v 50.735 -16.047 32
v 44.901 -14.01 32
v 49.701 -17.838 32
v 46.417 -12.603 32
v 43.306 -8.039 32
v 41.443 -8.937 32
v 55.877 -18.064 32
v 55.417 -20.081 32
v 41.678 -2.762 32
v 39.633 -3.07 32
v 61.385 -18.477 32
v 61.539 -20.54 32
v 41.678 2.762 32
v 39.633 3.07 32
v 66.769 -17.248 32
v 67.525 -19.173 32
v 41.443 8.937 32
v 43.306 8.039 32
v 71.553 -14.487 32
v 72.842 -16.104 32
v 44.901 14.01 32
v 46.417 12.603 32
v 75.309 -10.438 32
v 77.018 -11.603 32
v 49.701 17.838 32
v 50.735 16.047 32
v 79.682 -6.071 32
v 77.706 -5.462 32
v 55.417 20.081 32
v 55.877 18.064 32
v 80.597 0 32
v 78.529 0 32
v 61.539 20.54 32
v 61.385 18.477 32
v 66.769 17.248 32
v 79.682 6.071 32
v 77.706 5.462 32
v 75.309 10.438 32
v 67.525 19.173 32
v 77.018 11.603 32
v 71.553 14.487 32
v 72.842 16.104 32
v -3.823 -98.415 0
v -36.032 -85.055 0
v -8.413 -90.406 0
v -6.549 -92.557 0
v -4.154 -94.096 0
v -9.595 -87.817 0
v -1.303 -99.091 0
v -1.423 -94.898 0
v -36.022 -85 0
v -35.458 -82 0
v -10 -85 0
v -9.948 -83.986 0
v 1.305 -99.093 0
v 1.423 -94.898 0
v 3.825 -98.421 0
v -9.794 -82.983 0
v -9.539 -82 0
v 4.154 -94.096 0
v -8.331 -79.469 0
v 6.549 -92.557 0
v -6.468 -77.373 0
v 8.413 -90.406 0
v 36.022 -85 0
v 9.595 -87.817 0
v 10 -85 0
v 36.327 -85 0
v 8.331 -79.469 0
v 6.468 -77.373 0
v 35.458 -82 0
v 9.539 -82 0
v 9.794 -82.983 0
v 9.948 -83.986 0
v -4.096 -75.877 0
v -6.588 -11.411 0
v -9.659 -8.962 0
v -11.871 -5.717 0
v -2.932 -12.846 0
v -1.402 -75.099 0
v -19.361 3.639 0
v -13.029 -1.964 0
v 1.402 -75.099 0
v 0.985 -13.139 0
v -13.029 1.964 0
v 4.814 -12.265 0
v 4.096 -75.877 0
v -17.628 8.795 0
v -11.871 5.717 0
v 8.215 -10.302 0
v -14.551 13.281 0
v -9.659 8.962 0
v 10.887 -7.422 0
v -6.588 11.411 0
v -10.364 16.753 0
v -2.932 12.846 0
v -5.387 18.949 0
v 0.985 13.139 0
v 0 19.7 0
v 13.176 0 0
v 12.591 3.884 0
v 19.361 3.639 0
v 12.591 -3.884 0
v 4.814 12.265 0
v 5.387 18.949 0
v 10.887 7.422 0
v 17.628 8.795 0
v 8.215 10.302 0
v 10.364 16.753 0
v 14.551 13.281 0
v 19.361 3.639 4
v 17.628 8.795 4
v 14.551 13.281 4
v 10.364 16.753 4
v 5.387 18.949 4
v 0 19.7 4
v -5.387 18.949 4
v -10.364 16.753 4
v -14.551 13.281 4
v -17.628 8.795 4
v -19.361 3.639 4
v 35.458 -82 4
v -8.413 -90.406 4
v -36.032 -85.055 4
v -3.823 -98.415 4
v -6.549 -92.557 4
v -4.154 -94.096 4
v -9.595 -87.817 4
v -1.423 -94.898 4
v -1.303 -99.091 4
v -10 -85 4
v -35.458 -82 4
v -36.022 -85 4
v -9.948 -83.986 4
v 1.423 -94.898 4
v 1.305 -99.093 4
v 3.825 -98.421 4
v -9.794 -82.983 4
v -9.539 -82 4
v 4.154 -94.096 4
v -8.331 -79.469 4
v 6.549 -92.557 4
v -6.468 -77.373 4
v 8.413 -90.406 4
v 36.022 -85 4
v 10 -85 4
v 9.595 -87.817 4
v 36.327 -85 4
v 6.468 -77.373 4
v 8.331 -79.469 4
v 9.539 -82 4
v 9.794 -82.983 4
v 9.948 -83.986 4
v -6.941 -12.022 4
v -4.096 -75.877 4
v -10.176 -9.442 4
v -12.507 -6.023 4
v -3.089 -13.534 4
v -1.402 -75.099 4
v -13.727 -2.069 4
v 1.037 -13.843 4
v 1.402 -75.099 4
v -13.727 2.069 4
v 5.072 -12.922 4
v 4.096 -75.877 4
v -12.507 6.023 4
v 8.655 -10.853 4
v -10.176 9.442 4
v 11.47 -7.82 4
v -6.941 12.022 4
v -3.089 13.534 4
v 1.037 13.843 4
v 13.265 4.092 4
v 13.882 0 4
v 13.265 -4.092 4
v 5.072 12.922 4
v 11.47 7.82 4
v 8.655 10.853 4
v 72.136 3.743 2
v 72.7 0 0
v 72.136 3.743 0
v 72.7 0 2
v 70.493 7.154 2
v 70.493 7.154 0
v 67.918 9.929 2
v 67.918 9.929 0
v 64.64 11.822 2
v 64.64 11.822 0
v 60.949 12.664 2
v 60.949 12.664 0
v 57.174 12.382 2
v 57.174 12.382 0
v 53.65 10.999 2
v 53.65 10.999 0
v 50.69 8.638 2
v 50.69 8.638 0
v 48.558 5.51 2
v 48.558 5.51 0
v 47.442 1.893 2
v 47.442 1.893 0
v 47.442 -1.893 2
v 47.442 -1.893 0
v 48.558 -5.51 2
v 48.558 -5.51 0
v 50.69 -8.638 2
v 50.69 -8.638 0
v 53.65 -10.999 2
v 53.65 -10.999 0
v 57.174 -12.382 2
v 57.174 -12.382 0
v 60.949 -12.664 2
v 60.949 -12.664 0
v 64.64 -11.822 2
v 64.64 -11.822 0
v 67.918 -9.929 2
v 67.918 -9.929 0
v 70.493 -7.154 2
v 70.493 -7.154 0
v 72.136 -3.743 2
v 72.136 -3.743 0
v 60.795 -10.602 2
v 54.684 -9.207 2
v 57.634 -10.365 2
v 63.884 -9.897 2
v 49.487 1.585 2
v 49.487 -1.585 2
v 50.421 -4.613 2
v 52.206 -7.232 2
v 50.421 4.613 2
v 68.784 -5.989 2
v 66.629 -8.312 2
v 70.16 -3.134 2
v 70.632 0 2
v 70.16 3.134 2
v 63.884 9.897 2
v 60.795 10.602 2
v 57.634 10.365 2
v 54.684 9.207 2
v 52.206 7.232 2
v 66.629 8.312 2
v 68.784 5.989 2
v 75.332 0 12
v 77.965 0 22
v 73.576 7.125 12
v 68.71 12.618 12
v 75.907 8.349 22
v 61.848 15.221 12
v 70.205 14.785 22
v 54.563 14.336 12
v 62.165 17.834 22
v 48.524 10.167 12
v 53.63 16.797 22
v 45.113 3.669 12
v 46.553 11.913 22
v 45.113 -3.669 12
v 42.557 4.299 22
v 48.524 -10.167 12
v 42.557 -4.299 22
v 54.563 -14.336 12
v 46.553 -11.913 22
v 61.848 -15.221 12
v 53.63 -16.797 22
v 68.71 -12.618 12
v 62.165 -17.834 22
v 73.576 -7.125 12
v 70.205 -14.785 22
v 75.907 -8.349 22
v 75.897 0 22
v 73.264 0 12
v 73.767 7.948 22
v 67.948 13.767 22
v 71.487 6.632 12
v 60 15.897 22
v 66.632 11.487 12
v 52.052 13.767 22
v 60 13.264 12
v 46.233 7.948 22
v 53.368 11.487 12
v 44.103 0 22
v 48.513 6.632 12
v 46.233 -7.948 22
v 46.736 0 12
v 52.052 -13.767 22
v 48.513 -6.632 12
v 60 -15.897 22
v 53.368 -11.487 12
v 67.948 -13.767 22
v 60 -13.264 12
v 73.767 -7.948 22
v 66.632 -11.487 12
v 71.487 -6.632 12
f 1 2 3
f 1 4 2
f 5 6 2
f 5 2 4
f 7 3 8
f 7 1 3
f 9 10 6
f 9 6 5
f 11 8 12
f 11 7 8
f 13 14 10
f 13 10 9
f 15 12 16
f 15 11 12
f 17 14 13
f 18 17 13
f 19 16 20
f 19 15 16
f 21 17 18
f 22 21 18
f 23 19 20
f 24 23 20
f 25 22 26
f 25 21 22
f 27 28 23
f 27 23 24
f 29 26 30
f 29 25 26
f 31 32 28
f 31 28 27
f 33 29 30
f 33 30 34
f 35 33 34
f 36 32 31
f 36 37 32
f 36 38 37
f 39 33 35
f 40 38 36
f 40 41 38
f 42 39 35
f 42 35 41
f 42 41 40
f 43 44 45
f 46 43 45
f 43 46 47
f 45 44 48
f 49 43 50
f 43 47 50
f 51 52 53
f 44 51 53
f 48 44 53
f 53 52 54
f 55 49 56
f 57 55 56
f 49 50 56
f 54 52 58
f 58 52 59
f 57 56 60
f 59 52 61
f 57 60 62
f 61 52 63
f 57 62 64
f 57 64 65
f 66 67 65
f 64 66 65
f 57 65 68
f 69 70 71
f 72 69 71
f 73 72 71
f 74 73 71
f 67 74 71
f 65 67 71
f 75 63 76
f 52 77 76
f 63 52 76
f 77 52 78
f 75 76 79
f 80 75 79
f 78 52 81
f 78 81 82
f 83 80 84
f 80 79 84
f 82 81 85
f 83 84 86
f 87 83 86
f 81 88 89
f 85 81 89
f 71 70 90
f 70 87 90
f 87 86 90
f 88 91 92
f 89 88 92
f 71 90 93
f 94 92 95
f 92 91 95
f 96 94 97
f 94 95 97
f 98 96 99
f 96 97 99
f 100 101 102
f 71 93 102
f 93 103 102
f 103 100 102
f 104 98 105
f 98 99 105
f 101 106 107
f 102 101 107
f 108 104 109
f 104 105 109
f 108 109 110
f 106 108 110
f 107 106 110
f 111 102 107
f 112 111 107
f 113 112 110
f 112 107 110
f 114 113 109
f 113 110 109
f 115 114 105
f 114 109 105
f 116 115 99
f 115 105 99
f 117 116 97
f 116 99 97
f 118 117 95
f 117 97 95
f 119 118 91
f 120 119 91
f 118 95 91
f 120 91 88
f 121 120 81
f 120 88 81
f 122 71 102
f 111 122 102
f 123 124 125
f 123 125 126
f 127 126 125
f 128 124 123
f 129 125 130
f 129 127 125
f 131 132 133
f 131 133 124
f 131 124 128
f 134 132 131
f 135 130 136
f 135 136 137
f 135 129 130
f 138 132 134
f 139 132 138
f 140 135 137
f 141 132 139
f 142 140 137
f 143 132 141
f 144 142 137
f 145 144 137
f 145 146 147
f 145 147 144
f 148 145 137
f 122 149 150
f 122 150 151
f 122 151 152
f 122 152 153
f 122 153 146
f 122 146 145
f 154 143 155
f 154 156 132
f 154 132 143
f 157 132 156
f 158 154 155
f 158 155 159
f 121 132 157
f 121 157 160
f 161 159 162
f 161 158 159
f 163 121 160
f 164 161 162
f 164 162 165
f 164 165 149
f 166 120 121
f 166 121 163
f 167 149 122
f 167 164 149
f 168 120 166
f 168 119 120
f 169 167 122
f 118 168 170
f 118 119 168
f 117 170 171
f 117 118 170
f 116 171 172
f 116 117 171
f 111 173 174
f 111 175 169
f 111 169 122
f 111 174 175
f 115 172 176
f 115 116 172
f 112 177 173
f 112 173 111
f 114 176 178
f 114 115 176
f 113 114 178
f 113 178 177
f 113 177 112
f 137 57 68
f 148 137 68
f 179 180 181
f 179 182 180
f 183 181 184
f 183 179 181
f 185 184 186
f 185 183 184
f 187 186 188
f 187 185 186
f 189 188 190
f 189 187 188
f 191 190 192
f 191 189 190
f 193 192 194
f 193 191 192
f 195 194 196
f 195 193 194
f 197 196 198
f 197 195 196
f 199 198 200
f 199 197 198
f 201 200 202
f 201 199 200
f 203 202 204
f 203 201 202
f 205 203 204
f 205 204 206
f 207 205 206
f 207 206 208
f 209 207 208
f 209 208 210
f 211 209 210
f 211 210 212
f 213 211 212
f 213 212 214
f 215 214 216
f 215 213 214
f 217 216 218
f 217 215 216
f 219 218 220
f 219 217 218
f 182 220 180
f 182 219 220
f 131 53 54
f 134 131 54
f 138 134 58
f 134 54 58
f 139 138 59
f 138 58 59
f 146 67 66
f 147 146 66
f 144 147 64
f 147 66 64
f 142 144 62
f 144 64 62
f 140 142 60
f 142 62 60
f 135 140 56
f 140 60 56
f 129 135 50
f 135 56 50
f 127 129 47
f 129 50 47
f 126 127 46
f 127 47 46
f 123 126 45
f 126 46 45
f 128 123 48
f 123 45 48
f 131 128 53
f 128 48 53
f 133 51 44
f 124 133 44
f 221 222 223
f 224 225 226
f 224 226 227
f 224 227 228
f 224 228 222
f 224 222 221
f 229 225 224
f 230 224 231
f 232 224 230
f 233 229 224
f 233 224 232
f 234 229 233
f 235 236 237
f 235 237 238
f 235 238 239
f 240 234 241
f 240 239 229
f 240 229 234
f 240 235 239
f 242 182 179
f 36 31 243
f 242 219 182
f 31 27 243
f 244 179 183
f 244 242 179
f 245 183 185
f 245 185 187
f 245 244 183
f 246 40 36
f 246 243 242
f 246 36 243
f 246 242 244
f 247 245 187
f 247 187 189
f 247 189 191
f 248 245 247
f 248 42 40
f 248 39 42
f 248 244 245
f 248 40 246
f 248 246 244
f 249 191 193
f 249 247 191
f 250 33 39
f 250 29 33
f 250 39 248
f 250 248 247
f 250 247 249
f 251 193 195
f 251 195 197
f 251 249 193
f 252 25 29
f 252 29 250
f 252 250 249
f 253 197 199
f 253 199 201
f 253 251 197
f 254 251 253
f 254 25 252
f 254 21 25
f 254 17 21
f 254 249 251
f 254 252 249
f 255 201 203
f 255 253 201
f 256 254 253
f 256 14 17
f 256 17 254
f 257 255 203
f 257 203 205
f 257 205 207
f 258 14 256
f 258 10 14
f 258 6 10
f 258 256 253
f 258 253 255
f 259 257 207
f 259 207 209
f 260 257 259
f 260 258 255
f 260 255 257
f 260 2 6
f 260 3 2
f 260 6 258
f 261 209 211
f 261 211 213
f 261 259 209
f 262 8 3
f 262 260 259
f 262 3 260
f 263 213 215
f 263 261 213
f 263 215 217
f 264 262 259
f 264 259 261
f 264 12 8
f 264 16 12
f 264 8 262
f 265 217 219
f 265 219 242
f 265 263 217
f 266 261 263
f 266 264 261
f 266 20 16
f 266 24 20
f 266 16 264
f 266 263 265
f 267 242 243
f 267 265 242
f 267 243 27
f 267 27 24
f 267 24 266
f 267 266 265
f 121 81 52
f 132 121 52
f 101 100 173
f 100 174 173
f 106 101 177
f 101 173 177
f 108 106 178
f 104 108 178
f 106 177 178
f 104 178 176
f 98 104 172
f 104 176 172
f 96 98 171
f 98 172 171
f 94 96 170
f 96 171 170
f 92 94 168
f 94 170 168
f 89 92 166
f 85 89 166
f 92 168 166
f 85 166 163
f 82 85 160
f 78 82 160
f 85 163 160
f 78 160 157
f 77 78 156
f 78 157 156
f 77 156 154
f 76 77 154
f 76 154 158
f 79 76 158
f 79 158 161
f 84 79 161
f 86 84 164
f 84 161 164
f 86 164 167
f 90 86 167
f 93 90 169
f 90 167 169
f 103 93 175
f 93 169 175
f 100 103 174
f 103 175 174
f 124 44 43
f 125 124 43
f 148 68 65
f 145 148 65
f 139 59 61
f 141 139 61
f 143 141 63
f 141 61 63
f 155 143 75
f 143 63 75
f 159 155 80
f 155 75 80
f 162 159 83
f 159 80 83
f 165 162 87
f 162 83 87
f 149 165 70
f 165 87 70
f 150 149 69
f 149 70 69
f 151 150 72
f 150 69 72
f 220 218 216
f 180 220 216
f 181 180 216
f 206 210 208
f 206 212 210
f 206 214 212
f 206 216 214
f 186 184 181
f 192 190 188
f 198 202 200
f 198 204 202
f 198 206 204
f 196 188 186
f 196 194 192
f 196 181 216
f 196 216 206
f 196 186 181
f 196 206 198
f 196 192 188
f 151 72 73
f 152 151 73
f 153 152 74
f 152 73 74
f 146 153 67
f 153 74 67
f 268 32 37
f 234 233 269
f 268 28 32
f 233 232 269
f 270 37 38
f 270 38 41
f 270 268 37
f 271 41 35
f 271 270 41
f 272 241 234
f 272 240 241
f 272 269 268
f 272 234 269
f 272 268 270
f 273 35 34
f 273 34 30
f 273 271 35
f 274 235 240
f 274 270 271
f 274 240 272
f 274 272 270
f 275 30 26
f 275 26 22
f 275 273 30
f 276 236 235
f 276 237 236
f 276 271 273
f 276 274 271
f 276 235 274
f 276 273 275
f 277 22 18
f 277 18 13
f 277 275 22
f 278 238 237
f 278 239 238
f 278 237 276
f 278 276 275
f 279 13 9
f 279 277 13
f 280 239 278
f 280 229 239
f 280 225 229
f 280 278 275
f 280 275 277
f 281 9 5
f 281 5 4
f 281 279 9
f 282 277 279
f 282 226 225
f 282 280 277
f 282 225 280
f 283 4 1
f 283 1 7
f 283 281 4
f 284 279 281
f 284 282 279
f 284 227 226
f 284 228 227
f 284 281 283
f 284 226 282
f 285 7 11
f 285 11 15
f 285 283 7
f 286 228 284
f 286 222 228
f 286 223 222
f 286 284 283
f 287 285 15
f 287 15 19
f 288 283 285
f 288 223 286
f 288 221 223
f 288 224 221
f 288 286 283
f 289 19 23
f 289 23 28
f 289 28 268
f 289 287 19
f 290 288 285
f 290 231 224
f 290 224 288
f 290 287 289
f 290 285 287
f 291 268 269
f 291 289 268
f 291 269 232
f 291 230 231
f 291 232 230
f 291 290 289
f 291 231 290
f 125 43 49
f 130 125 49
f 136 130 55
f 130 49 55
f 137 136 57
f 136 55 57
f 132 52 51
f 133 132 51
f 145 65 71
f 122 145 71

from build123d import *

# Parameters (mm, degrees)
F0_R     = 13
F1_DEPTH = 4


# Not quite as in the source:
# - a fillet or chamfer that OpenCascade refuses, or shapes differently, is made with other operations: its cross-section is extruded or revolved along the edge and cut away or added


with BuildPart() as f1:
    # F0 (on Top) → F1 (new body)
    with BuildSketch(Plane.XY):
        with BuildLine():
            Line((-36.0218728627, -85), (-10, -85))
            ThreePointArc((-10, -85), (-9.8841772582, -83.4824230072), (-9.5393920142, -82))
            Line((-9.5393920142, -82), (-35.4579826076, -82))
            Line((-35.4579826076, -82), (-36.0218728627, -85))
        make_face()
        with BuildLine():
            Line((10, -85), (36.0218728627, -85))
            Line((36.0218728627, -85), (35.4579826076, -82))
            Line((35.4579826076, -82), (9.5393920142, -82))
            ThreePointArc((9.5393920142, -82), (9.8841772582, -83.4824230072), (10, -85))
        make_face()
        with BuildLine():
            Line((9.5393920142, -82), (35.4579826076, -82))
            Line((35.4579826076, -82), (19.3609549854, 3.6391512822))
            ThreePointArc((19.3609549854, 3.6391512822), (0, 19.7), (-19.3609549854, 3.6391512822))
            Line((-19.3609549854, 3.6391512822), (-35.4579826076, -82))
            Line((-35.4579826076, -82), (-9.5393920142, -82))
            ThreePointArc((-9.5393920142, -82), (0, -75), (9.5393920142, -82))
        make_face()
        Circle(F0_R, mode=Mode.SUBTRACT)
        with BuildLine():
            Line((3.8250876827, -98.4205655408), (36.3271264003, -85))
            Line((36.3271264003, -85), (36.0218728627, -85))
            Line((36.0218728627, -85), (10, -85))
            ThreePointArc((10, -85), (0, -95), (-10, -85))
            Line((-10, -85), (-36.0218728627, -85))
            Line((-36.0218728627, -85), (-36.0322895223, -85.0554185474))
            Line((-36.0322895223, -85.0554185474), (-3.822600818, -98.4145562205))
            ThreePointArc((-3.822600818, -98.4145562205), (0.0006462735, -99.1775278473), (3.8250876827, -98.4205655408))
        make_face()
    extrude(amount=F1_DEPTH)

    # F4: chamfer of 5 x 0.8816349035 on 1 edges, made by hand

    # F4_s1 → F4_t2 (revolve, cut)
    with BuildSketch(Plane.XZ):
        Polygon((13, -1), (13.8816349035, 4), (13, 4), align=None)
    revolve(axis=Axis((0, 0, 4), (0, 0, 1)), mode=Mode.SUBTRACT)


with BuildPart() as f3:
    # F2 (on Front) → F3 (revolve)
    with BuildSketch(Plane.XZ):
        Polygon((60, 2), (60, 0), (72.7, 0), (72.7, 2), (80.5971898989, 32), (78.5290553575, 32), (70.6318654586, 2), align=None)
    revolve(axis=Axis((60, 0, 12.6420042982), (0, 0, 1)))


solid = Compound([f1.part, f3.part])
